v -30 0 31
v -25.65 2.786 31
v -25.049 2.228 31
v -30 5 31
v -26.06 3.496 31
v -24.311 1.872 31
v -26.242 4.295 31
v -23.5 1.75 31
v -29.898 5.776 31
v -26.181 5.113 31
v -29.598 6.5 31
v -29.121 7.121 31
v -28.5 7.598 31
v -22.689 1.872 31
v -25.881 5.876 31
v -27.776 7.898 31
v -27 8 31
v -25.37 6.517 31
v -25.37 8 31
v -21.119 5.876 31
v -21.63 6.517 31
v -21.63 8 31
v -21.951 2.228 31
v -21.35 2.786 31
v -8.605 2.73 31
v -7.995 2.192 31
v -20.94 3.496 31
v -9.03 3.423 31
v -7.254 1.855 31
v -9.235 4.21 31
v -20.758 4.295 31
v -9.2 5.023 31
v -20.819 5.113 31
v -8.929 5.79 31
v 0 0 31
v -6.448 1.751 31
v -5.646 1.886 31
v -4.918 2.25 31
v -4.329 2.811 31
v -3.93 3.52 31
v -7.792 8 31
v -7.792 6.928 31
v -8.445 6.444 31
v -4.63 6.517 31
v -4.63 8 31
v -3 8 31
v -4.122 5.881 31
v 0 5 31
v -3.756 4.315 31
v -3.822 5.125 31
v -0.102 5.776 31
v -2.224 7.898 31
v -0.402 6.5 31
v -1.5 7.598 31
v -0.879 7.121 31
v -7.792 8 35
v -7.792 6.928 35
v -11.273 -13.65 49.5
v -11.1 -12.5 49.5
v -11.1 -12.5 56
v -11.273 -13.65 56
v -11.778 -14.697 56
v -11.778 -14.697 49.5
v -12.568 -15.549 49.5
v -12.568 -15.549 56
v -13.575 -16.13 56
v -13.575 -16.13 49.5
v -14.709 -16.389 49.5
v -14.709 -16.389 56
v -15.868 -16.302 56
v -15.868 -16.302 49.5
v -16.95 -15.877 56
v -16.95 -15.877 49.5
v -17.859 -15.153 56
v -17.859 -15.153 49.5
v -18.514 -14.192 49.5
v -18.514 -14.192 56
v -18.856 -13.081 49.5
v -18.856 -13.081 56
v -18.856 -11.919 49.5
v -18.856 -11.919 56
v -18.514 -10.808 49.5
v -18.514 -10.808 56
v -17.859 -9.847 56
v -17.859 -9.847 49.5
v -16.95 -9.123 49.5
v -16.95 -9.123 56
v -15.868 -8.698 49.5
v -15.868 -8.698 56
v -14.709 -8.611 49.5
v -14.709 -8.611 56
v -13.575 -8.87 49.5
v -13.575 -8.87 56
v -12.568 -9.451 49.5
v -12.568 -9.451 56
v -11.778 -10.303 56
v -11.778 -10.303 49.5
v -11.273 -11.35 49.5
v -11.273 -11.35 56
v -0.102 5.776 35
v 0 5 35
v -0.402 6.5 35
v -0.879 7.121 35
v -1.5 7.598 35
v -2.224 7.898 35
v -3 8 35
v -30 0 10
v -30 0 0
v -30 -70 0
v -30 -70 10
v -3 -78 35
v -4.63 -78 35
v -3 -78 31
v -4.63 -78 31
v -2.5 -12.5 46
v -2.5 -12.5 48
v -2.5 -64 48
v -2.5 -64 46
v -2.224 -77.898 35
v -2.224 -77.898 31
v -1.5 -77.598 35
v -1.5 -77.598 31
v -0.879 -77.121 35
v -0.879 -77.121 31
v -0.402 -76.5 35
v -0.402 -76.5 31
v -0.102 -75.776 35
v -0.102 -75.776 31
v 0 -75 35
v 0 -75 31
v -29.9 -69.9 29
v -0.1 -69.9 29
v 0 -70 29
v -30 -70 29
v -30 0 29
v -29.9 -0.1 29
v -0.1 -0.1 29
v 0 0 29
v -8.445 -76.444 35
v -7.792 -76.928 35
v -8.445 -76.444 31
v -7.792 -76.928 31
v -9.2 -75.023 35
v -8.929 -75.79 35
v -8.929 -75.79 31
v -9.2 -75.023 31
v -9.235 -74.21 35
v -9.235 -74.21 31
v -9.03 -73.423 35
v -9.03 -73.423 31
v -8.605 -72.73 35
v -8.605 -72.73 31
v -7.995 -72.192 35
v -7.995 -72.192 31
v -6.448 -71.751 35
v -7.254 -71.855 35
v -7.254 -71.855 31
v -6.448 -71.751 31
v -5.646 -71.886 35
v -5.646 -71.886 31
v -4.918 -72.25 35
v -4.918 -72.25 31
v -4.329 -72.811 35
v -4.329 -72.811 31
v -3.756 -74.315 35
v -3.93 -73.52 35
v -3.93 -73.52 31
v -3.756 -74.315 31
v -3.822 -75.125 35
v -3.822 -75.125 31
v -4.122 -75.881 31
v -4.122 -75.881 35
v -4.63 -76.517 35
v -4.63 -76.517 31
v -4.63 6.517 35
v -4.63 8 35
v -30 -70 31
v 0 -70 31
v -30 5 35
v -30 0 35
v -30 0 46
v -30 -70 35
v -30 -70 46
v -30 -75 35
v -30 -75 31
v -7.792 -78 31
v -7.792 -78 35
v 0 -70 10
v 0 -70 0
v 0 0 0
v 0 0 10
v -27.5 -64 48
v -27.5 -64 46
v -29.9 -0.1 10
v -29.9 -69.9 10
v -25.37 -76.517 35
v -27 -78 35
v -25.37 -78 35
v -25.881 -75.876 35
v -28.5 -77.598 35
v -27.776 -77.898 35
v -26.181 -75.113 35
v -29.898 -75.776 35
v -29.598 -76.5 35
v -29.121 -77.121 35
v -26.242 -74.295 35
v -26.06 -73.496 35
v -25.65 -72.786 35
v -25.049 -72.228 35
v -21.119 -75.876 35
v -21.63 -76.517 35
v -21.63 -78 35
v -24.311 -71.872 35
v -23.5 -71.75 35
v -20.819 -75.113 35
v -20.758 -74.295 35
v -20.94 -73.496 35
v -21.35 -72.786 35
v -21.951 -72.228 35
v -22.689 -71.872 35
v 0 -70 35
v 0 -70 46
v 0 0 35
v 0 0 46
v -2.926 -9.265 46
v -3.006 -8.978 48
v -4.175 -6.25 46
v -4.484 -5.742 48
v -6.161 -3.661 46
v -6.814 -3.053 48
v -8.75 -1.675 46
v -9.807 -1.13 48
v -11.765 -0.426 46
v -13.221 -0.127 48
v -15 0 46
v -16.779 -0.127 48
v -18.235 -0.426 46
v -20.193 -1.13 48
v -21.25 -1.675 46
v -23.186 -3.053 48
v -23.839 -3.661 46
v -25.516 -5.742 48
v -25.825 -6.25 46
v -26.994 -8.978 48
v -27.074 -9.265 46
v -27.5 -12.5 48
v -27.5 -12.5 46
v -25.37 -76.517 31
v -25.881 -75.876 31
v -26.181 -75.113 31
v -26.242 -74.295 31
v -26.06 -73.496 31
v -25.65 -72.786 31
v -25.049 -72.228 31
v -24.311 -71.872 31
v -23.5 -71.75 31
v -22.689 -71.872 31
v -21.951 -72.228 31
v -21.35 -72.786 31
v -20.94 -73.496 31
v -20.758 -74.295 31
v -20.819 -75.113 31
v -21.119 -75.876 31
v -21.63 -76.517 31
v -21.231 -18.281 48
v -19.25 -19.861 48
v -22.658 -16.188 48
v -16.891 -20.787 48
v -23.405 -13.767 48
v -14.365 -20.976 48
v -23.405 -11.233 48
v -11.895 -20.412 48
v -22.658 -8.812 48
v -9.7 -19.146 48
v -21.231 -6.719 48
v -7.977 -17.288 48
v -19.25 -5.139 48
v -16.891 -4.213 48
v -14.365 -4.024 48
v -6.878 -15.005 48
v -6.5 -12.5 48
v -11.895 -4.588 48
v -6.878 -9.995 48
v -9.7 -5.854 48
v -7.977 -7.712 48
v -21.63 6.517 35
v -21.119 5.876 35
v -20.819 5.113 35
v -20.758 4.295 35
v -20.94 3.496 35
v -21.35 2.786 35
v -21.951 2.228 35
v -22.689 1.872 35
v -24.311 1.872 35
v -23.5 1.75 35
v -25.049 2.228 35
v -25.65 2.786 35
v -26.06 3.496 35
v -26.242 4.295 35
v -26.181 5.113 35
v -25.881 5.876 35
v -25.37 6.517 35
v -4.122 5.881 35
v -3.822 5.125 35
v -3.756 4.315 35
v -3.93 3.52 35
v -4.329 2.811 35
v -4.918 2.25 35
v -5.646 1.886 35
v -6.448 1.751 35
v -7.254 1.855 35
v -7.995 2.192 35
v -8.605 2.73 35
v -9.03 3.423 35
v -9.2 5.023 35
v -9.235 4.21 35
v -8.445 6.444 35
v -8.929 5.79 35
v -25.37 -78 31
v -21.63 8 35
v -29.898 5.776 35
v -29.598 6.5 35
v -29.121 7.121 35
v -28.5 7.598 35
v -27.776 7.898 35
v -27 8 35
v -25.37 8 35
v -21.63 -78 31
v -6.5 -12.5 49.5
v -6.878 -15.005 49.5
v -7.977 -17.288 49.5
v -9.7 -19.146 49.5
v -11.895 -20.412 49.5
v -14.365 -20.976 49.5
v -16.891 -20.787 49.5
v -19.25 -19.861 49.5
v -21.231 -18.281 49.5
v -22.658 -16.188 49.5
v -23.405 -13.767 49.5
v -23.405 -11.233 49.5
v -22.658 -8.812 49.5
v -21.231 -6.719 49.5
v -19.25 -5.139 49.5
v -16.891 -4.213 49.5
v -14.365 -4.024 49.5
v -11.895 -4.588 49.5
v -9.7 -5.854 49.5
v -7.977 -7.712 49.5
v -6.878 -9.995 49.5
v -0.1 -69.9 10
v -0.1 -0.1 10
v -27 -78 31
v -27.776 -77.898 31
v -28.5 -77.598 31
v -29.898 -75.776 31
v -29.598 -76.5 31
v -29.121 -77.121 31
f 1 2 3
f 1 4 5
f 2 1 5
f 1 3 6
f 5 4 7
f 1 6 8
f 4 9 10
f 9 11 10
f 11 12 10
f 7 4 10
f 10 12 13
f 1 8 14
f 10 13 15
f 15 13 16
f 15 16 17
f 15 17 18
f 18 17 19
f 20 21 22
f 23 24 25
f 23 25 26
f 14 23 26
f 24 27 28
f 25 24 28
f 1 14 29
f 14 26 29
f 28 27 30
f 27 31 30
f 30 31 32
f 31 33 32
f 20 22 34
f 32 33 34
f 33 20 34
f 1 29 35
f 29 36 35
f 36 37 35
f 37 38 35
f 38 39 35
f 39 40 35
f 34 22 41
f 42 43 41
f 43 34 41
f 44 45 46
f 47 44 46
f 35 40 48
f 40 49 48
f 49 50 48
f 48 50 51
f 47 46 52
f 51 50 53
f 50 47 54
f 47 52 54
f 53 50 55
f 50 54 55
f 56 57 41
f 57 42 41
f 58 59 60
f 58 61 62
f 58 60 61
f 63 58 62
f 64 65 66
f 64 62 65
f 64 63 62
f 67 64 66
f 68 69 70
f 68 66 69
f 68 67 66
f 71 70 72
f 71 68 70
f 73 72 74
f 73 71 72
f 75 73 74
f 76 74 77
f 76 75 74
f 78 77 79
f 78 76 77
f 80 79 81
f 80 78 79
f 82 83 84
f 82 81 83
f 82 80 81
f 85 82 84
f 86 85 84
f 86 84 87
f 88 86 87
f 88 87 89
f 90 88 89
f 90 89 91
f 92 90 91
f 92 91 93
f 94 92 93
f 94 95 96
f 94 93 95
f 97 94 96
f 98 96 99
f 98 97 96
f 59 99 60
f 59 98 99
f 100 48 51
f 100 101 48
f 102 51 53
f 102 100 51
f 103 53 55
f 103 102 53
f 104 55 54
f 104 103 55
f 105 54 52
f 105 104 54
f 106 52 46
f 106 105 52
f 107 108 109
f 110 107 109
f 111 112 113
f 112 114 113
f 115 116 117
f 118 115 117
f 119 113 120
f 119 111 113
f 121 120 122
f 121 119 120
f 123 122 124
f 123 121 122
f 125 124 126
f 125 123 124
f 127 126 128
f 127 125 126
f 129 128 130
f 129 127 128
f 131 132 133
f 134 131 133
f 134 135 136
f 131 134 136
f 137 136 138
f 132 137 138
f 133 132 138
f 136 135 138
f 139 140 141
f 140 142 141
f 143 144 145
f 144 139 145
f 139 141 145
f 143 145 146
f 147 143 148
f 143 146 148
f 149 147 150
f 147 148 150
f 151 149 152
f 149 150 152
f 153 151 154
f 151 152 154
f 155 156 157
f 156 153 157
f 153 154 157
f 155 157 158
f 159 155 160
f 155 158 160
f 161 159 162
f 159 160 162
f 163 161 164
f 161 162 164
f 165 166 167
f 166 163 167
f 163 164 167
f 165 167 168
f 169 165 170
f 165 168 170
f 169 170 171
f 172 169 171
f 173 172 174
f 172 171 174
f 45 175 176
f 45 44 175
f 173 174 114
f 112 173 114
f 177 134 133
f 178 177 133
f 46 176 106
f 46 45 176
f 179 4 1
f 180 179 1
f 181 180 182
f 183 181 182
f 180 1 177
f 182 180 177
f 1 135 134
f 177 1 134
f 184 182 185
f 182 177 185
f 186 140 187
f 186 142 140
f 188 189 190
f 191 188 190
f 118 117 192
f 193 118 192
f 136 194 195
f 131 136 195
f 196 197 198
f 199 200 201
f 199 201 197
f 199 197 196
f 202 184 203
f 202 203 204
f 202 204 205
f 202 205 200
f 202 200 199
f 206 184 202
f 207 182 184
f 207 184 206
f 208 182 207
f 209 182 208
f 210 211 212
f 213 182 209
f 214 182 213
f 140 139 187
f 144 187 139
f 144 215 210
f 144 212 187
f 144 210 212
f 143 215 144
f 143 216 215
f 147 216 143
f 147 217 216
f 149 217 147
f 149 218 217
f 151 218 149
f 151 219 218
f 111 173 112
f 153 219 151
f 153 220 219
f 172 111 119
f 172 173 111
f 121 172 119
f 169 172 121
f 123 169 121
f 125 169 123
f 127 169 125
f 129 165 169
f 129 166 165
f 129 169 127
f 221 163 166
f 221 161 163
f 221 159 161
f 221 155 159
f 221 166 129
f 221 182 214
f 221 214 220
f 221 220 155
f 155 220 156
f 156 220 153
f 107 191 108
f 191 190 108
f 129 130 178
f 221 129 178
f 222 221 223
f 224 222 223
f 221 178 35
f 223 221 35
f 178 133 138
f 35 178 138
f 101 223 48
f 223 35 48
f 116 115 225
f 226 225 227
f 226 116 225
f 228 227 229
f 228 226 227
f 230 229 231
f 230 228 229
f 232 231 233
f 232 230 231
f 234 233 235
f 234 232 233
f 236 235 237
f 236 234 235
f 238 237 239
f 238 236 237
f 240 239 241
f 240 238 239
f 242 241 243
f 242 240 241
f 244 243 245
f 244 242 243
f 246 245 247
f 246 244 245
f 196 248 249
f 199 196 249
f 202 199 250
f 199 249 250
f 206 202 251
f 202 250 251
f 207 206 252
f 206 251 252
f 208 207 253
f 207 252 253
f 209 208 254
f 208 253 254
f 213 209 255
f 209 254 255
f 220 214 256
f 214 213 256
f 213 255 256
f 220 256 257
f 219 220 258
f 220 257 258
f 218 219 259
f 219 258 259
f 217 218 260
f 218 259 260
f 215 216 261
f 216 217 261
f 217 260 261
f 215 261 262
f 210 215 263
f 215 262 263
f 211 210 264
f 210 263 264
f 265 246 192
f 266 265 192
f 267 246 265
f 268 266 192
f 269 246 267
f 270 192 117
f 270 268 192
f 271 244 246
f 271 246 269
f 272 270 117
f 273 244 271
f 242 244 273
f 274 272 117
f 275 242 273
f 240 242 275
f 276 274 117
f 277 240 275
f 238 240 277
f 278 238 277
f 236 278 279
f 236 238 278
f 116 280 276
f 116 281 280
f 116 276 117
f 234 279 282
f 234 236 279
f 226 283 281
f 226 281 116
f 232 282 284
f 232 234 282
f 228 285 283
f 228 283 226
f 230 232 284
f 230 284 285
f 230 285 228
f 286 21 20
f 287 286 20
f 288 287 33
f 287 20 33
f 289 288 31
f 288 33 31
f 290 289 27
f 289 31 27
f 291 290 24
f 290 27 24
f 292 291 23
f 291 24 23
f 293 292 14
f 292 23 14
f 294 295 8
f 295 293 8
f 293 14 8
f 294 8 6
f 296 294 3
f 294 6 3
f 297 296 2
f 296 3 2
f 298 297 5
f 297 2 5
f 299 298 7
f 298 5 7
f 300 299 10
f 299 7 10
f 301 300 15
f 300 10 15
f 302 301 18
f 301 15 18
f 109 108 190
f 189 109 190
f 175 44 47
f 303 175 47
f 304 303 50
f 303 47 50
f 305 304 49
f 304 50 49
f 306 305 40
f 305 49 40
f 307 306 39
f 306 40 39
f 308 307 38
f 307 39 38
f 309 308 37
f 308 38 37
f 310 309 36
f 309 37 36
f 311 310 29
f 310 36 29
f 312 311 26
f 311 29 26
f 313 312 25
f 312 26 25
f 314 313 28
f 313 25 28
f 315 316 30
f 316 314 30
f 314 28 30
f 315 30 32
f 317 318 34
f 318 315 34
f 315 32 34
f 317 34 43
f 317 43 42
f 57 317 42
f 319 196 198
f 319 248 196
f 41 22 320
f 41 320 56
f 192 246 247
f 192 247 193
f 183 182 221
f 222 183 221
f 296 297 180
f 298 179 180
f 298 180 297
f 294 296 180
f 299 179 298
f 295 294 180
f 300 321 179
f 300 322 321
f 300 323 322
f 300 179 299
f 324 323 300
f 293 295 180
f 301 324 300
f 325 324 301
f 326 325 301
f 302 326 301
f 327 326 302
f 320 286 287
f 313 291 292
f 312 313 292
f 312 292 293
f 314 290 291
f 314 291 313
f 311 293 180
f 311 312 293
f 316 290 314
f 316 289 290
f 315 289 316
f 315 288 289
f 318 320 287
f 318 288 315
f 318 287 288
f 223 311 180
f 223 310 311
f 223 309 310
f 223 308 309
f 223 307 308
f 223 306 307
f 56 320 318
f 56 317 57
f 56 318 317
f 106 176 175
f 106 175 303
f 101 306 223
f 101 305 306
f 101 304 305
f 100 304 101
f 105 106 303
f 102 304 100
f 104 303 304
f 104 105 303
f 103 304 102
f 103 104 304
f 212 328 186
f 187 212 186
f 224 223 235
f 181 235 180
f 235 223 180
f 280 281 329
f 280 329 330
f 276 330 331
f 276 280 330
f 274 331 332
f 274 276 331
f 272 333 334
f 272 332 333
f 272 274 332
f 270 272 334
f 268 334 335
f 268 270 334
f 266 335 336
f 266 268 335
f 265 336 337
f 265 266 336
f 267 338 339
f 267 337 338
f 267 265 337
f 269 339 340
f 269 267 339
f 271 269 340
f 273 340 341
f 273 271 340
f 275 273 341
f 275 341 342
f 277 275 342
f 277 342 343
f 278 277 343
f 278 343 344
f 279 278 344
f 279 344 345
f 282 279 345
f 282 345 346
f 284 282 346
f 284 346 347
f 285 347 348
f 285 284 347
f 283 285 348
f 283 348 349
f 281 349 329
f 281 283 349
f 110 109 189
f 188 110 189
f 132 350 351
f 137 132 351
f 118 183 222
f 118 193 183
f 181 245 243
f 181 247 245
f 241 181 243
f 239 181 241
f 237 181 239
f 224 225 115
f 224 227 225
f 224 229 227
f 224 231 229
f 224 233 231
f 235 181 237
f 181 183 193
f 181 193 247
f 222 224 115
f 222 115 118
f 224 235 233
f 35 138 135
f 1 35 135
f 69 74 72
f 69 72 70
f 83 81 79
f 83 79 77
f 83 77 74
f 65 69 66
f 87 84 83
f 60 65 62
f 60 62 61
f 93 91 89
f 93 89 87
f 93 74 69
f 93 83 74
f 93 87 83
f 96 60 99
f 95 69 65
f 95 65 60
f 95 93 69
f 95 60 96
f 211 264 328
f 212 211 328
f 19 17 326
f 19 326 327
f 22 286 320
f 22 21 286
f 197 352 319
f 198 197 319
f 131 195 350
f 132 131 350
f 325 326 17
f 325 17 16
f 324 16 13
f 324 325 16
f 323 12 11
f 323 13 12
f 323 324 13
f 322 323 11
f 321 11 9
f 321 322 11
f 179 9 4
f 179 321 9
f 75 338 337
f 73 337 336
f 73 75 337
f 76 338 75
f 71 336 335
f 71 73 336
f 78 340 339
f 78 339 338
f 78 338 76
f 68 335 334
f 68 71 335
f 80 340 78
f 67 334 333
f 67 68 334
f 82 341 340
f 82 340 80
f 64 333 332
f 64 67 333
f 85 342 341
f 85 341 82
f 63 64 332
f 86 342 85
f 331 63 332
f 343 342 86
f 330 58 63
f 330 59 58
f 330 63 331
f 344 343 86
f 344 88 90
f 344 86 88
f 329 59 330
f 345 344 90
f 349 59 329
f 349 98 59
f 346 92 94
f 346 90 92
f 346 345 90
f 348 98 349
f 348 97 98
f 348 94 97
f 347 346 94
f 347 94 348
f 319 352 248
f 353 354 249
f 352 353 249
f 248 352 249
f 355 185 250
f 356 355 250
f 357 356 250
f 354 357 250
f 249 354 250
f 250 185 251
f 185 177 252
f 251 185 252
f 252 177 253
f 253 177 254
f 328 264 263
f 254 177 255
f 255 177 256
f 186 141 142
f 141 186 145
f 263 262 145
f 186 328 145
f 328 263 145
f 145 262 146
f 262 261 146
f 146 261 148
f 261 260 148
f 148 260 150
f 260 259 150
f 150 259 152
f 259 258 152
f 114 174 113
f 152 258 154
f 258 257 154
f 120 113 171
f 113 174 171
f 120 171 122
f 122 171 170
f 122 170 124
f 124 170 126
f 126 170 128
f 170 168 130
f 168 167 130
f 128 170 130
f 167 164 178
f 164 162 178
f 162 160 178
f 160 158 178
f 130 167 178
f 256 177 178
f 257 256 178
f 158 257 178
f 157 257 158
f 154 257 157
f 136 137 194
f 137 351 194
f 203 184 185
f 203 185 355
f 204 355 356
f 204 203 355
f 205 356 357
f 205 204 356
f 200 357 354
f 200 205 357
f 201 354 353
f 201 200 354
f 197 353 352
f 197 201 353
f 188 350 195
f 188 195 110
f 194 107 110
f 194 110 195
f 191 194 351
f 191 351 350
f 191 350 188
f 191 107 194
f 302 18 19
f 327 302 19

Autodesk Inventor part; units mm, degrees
ref_plane "YZ Plane" through (0, 0, 0) normal (1, 0, 0) x (0, 1, 0)
ref_plane "XZ Plane" through (0, 0, 0) normal (0, 1, 0) x (-1, 0, 0)
sketch "Sketch1" plane through (0, 0, 0) normal (0, 0, 1) x (1, 0, 0)
  line L0 (0, 0) -> (-30, 0)
  line L1 (-30, 0) -> (-30, -70)
  line L2 (-30, -70) -> (0, -70)
  line L3 (0, -70) -> (0, 0)
  dimension "d0" = 30
  dimension "d1" = 70
extrude "Extrusion1" add sketch "Sketch1" along normal blind 10
sketch "Sketch2" plane through (0, 0, 10) normal (0, 0, 1) x (1, 0, 0)
  line L0 (-30, 0) -> (-30, -70) projected
  line L1 (-30, -70) -> (0, -70) projected
  line L2 (0, -70) -> (0, 0) projected
  line L3 (0, 0) -> (-30, 0) projected
  line L4 (0, 0) -> (-30, 0) projected
  line L5 (-30, -70) -> (0, -70) projected
  line L6 (-0.1, -70) -> (-0.1, -0.1)
  line L7 (-0.1, -0.1) -> (-30, -0.1)
  line L8 (-29.9, 0) -> (-29.9, -70)
  line L9 (-30, -69.9) -> (0, -69.9)
  point P0 (-29.9, -69.9)
  point P1 (-0.1, -69.9)
  point P2 (-29.9, -0.1)
  dimension "d29" = 0.1
  dimension "d30" = 0.1
  dimension "d31" = 0.1
extrude "Extrusion2" add sketch "Sketch2" along normal blind 19 contours L7 L6 L9 L8
sketch "Sketch3" plane through (0, 0, 29) normal (0, 0, 1) x (1, 0, 0)
  line L0 (-30, -70) -> (0, -70) projected
  line L1 (-30, 0) -> (-30, -70) projected
  line L2 (0, -70) -> (0, 0) projected
  line L3 (-30, -70) -> (0, -70) projected
  line L4 (0, 0) -> (-30, 0) projected
  line L5 (0, 0) -> (-30, 0) projected
  line L6 (0, -70) -> (0, 0) projected
  point P0 (-0.01, -70)
  point P1 (-0.01, 0)
extrude "Extrusion3" add sketch "Sketch3" along normal blind 19
sketch "Sketch4" plane through (0, 0, 48) normal (0, 0, 1) x (1, 0, 0)
  circle A0 centre (-15, -12.5) radius 8.5
  line L0 (0, 0) -> (-30, 0) projected
  dimension "d8" = 17
  dimension "d26" = 12.5
extrude "Extrusion4" add sketch "Sketch4" along normal blind 1.5
sketch "Sketch5" plane through (-15, -12.5, 49.5) normal (0, 0, 1) x (1, 0, 0)
  circle A0 centre (0, 0) radius 3.9
  point P0 (15, 12.5)
  dimension "d11" = 7.8
extrude "Extrusion5" add sketch "Sketch5" along normal blind 6.5
ref_plane "Work Plane1" through (0, 0, 31) normal (0, 0, 1) x (1, 0, 0)
sketch "Sketch6" plane through (0, 0, 31) normal (0, 0, 1) x (1, 0, 0)
  line L0 (-30, -70) -> (0, -70) projected
  line L1 (0, -70) -> (-30, -70)
  line L2 (-30, -70) -> (-30, -78)
  line L3 (0, -78) -> (0, -70)
  arc A0 (-4.6303, -76.5166) -> (-7.7916, -76.9278) centre (-6.5, -74.5) ccw
  arc A1 (-21.6303, -76.5166) -> (-25.3697, -76.5166) centre (-23.5, -74.5) ccw
  line L4 (-4.6303, -76.5166) -> (-4.6303, -78)
  line L5 (-7.7916, -76.9278) -> (-7.7916, -78)
  line L6 (-4.6303, -78) -> (0, -78)
  line L7 (-30, -78) -> (-25.3697, -78)
  line L8 (-21.6303, -78) -> (-7.7916, -78)
  line L9 (-21.6303, -76.5166) -> (-21.6303, -78)
  line L10 (-25.3697, -76.5166) -> (-25.3697, -78)
  line L11 (0, -70) -> (0, 0) projected
  line L12 (0, -35) -> (-30, -35) construction
  line L13 (-30, 0) -> (0, 0)
  line L14 (0, 0) -> (-30, 0)
  line L15 (-30, 0) -> (-30, 8)
  line L16 (0, 8) -> (0, 0)
  arc A2 (-7.7916, 6.9278) -> (-4.6303, 6.5166) centre (-6.5, 4.5) ccw
  arc A3 (-25.3697, 6.5166) -> (-21.6303, 6.5166) centre (-23.5, 4.5) ccw
  line L17 (-4.6303, 6.5166) -> (-4.6303, 8)
  line L18 (-7.7916, 6.9278) -> (-7.7916, 8)
  line L19 (-4.6303, 8) -> (0, 8)
  line L20 (-30, 8) -> (-25.3697, 8)
  line L21 (-21.6303, 8) -> (-7.7916, 8)
  line L22 (-21.6303, 6.5166) -> (-21.6303, 8)
  line L23 (-25.3697, 6.5166) -> (-25.3697, 8)
  point P0 (-0.01, -70)
  dimension "d15" = 30
  dimension "d16" = 8
  dimension "d17" = 5.5
  dimension "d18" = 5.5
  dimension "d21" = 6.5
  dimension "d22" = 6.5
extrude "Extrusion6" add sketch "Sketch6" along normal blind 4
fillet "Fillet1" radius 3 4 edges at (-30, 8, 33) (0, 8, 33) (-30, -78, 33) (0, -78, 33)
sketch "Sketch7" plane through (0, 0, 48) normal (0, 0, 1) x (1, 0, 0)
  point P0 (0, 0)
sketch "Sketch8" plane through (0, 0, 48) normal (0, 0, 1) x (1, 0, 0)
  circle A0 centre (-15, -12.5) radius 8.5 projected
  circle A1 centre (-15, -12.5) radius 12.5
  line L0 (0, -70) -> (0, 0) projected
  line L1 (-2.5, -64) -> (-27.5, -64)
  line L2 (-30, 0) -> (-30, -70) projected
  line L3 (-2.5, -12.5) -> (-2.5, -64)
  line L4 (-27.5, -12.5) -> (-27.5, -64)
  line L5 (-30, -70) -> (0, -70) projected
  line L6 (0, 0) -> (-30, 0) projected
  point P0 (-15, 0)
extrude "Extrusion7" cut sketch "Sketch8" against normal blind 2 contours L6 L0 L5 L2
properties part number "serwo 30x70"
